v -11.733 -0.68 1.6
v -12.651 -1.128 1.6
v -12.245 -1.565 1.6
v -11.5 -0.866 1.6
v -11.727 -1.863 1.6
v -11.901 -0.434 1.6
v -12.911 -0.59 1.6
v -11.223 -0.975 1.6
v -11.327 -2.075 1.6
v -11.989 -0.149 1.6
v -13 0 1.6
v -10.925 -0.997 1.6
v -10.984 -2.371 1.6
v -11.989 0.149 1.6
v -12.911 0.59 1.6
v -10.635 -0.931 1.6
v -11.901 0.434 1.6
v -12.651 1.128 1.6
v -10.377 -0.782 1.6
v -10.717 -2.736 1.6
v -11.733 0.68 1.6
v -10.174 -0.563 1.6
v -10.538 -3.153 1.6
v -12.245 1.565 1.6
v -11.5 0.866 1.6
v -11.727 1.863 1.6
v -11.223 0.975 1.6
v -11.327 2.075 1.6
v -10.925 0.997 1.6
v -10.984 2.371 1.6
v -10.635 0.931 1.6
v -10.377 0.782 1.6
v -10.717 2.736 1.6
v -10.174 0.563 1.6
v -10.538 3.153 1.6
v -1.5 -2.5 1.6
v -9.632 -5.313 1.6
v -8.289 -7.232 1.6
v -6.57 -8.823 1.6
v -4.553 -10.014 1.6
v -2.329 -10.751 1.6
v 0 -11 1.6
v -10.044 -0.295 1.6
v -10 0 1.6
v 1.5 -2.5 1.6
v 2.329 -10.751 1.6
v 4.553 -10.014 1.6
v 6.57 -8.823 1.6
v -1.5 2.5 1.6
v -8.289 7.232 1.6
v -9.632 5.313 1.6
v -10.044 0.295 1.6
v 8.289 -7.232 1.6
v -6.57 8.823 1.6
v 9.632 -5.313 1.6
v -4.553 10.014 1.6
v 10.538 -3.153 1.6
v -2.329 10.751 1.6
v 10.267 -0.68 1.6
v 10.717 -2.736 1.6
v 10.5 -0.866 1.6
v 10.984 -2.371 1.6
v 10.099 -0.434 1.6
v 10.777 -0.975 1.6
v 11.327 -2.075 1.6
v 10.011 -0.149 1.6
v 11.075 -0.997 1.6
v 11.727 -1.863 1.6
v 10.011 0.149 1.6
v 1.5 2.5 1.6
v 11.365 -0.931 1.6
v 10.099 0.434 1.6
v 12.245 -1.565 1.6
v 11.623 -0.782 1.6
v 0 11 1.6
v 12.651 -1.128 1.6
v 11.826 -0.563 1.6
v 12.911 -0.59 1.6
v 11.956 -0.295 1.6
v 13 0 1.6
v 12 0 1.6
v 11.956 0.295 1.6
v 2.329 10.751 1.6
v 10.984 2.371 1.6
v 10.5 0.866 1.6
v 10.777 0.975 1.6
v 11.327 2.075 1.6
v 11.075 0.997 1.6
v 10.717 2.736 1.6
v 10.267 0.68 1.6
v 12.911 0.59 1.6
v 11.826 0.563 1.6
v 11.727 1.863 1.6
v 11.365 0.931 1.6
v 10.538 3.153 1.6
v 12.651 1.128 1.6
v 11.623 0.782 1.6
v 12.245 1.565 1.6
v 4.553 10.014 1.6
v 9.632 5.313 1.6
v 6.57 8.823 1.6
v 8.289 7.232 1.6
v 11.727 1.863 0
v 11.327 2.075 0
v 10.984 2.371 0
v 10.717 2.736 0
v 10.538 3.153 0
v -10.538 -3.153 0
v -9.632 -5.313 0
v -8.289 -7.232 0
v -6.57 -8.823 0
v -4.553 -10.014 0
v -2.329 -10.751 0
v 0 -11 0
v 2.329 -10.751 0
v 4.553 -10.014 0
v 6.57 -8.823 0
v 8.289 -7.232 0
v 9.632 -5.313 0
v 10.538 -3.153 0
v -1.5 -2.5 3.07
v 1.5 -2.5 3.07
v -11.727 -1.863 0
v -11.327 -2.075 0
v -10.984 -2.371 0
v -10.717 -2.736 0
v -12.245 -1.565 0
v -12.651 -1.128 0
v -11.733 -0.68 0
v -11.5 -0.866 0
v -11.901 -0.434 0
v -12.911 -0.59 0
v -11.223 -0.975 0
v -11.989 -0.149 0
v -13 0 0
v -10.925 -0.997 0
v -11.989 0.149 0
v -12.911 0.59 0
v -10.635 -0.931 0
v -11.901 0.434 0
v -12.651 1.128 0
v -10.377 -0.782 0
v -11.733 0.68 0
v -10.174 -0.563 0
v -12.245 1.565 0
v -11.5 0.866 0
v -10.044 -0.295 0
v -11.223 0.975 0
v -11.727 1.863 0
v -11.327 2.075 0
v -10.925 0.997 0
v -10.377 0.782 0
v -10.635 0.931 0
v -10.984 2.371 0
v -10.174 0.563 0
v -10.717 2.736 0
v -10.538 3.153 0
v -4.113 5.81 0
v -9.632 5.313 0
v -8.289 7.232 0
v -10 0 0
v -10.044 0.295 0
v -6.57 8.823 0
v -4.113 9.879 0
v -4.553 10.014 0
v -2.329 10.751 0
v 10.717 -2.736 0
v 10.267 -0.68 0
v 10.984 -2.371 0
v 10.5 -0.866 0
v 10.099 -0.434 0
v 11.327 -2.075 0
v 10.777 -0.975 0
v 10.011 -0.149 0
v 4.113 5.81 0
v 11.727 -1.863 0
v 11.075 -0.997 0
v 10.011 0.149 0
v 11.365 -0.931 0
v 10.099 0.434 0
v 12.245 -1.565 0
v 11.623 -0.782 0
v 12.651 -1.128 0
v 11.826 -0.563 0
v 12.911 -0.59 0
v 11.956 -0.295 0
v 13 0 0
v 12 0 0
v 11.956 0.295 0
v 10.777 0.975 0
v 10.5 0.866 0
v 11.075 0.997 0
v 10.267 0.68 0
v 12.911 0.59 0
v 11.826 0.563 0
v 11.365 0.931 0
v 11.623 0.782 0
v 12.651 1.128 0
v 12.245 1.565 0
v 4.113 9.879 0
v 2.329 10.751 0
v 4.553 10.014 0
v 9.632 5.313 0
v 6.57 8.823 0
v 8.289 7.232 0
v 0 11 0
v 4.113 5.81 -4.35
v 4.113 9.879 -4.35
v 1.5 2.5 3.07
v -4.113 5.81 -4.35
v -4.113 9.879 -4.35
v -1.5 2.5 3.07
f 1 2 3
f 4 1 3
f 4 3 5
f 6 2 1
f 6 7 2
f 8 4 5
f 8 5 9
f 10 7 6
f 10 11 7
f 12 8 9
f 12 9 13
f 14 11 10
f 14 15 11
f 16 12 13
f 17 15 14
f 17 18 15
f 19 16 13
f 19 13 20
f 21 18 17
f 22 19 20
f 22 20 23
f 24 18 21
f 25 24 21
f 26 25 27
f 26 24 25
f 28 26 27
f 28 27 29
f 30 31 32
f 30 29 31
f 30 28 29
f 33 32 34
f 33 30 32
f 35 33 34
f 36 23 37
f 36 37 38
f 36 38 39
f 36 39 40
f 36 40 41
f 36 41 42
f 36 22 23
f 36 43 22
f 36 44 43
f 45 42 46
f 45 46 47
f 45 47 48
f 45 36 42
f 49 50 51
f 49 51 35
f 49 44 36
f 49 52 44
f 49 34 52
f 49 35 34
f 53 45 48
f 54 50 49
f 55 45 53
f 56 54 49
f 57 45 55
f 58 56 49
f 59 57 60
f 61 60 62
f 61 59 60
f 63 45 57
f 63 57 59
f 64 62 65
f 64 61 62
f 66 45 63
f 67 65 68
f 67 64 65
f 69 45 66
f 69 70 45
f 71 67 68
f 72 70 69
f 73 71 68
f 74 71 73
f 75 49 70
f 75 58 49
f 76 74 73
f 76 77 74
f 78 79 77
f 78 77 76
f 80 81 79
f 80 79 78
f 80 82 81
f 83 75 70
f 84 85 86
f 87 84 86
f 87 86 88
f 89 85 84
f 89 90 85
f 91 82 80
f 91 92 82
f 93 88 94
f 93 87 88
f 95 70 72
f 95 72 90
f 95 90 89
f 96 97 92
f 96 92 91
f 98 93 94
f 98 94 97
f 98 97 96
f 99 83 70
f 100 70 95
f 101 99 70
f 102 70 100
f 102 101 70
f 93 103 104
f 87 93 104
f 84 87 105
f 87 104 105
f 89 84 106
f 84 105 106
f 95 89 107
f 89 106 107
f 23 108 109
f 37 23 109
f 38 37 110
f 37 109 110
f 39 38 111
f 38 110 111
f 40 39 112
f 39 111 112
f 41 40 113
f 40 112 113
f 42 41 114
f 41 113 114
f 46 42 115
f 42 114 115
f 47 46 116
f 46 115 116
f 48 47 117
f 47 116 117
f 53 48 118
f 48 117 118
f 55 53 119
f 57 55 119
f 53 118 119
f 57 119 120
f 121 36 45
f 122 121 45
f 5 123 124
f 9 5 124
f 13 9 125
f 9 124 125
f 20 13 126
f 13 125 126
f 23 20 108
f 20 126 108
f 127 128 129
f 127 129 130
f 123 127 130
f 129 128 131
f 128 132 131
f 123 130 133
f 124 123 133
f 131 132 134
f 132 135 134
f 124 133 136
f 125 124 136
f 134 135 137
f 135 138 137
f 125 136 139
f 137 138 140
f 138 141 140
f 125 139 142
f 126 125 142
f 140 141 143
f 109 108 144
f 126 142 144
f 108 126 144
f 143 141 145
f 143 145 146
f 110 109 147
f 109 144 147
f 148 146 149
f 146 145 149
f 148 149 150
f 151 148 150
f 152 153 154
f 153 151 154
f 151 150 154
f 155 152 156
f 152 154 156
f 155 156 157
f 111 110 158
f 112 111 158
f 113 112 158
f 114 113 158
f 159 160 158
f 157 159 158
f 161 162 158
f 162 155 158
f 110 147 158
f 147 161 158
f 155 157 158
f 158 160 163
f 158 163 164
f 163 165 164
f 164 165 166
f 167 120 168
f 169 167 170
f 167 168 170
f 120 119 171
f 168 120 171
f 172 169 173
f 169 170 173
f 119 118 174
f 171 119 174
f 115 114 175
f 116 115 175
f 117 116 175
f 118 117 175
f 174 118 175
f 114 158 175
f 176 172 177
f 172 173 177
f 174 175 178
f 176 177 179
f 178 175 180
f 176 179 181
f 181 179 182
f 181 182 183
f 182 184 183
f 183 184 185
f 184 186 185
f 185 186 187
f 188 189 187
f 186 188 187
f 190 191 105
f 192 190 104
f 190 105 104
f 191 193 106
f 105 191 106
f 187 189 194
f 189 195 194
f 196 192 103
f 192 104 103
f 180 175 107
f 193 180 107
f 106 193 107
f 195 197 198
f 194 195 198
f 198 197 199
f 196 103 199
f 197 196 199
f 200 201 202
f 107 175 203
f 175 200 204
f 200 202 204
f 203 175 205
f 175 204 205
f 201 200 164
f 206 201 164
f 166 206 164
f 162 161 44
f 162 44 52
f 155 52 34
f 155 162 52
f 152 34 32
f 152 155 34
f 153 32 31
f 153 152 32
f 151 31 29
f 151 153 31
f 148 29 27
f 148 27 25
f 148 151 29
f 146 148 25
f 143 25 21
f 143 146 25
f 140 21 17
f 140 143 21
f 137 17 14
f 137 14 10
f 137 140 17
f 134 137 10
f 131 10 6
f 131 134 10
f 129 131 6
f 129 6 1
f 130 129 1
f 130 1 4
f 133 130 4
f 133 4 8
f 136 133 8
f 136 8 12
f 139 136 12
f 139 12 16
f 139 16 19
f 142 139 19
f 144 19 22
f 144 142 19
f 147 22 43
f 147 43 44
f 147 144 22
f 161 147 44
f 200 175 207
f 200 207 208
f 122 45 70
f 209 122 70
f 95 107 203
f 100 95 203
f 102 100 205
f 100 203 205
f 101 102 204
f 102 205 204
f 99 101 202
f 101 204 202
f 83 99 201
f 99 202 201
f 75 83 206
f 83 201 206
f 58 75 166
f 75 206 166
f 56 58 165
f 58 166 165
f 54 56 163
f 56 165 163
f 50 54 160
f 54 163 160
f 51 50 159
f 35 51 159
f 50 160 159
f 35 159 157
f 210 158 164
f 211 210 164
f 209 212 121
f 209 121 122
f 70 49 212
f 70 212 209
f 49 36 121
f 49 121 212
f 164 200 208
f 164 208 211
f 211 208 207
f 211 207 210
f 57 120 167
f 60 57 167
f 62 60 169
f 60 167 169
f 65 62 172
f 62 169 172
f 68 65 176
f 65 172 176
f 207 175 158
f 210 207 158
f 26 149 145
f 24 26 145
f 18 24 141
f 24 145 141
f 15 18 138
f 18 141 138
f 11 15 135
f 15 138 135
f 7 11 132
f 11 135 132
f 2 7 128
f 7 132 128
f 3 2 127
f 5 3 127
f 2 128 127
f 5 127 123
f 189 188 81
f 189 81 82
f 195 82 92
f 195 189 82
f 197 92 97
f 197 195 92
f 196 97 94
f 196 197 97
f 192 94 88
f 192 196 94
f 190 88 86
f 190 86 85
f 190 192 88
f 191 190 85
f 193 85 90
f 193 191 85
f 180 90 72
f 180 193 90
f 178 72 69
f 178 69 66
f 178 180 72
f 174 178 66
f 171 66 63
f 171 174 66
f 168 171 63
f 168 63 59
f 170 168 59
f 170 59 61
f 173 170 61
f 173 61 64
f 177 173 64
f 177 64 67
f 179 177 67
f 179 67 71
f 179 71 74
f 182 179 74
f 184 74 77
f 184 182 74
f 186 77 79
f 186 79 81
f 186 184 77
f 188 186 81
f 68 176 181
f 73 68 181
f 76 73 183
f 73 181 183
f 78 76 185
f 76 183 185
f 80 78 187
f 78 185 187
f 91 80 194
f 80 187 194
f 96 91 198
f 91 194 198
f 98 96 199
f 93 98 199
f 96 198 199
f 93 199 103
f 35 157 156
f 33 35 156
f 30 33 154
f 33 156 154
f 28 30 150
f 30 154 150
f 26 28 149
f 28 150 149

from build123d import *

# Parameters (mm, degrees)
SKETCH_1_R      = 1
EXTRUDE_1_DEPTH = 1.6
SKETCH_2_W      = 3
SKETCH_2_H      = 5
EXTRUDE_2_DEPTH = 1.47
SKETCH_3_W      = 8.226
SKETCH_3_H      = 4.069
EXTRUDE_3_DEPTH = 4.35


with BuildPart() as part:
    # 草图1 → 凸台-拉伸1 (new body)
    with BuildSketch(Plane.XY):
        with BuildLine():
            ThreePointArc((-10.538461538, -3.152907928), (0, -11), (10.538461538, -3.152907928))
            ThreePointArc((10.538461538, -3.152907928), (10.98391758, -2.370710612), (11.727272727, -1.863081957))
            ThreePointArc((11.727272727, -1.863081957), (13, 0), (11.727272727, 1.863081957))
            ThreePointArc((11.727272727, 1.863081957), (10.98391758, 2.370710612), (10.538461538, 3.152907928))
            ThreePointArc((10.538461538, 3.152907928), (0, 11), (-10.538461538, 3.152907928))
            ThreePointArc((-10.538461538, 3.152907928), (-10.98391758, 2.370710612), (-11.727272727, 1.863081957))
            ThreePointArc((-11.727272727, 1.863081957), (-13, 0), (-11.727272727, -1.863081957))
            ThreePointArc((-11.727272727, -1.863081957), (-10.98391758, -2.370710612), (-10.538461538, -3.152907928))
        make_face()
        with Locations((-11, 0)):
            Circle(SKETCH_1_R, mode=Mode.SUBTRACT)
        with Locations((11, 0)):
            Circle(SKETCH_1_R, mode=Mode.SUBTRACT)
    extrude(amount=EXTRUDE_1_DEPTH)

    # 草图2 → 凸台-拉伸2 (add)
    with BuildSketch(Plane.XY.offset(1.6)):
        Rectangle(SKETCH_2_W, SKETCH_2_H)
    extrude(amount=EXTRUDE_2_DEPTH)

    # 草图3 → 凸台-拉伸3 (add)
    with BuildSketch(Plane(origin=(0, 0, 0), x_dir=(-1, 0, 0), z_dir=(0, 0, -1))):
        with Locations((0, 7.8445)):
            Rectangle(SKETCH_3_W, SKETCH_3_H)
    extrude(amount=EXTRUDE_3_DEPTH)


solid = part.part
